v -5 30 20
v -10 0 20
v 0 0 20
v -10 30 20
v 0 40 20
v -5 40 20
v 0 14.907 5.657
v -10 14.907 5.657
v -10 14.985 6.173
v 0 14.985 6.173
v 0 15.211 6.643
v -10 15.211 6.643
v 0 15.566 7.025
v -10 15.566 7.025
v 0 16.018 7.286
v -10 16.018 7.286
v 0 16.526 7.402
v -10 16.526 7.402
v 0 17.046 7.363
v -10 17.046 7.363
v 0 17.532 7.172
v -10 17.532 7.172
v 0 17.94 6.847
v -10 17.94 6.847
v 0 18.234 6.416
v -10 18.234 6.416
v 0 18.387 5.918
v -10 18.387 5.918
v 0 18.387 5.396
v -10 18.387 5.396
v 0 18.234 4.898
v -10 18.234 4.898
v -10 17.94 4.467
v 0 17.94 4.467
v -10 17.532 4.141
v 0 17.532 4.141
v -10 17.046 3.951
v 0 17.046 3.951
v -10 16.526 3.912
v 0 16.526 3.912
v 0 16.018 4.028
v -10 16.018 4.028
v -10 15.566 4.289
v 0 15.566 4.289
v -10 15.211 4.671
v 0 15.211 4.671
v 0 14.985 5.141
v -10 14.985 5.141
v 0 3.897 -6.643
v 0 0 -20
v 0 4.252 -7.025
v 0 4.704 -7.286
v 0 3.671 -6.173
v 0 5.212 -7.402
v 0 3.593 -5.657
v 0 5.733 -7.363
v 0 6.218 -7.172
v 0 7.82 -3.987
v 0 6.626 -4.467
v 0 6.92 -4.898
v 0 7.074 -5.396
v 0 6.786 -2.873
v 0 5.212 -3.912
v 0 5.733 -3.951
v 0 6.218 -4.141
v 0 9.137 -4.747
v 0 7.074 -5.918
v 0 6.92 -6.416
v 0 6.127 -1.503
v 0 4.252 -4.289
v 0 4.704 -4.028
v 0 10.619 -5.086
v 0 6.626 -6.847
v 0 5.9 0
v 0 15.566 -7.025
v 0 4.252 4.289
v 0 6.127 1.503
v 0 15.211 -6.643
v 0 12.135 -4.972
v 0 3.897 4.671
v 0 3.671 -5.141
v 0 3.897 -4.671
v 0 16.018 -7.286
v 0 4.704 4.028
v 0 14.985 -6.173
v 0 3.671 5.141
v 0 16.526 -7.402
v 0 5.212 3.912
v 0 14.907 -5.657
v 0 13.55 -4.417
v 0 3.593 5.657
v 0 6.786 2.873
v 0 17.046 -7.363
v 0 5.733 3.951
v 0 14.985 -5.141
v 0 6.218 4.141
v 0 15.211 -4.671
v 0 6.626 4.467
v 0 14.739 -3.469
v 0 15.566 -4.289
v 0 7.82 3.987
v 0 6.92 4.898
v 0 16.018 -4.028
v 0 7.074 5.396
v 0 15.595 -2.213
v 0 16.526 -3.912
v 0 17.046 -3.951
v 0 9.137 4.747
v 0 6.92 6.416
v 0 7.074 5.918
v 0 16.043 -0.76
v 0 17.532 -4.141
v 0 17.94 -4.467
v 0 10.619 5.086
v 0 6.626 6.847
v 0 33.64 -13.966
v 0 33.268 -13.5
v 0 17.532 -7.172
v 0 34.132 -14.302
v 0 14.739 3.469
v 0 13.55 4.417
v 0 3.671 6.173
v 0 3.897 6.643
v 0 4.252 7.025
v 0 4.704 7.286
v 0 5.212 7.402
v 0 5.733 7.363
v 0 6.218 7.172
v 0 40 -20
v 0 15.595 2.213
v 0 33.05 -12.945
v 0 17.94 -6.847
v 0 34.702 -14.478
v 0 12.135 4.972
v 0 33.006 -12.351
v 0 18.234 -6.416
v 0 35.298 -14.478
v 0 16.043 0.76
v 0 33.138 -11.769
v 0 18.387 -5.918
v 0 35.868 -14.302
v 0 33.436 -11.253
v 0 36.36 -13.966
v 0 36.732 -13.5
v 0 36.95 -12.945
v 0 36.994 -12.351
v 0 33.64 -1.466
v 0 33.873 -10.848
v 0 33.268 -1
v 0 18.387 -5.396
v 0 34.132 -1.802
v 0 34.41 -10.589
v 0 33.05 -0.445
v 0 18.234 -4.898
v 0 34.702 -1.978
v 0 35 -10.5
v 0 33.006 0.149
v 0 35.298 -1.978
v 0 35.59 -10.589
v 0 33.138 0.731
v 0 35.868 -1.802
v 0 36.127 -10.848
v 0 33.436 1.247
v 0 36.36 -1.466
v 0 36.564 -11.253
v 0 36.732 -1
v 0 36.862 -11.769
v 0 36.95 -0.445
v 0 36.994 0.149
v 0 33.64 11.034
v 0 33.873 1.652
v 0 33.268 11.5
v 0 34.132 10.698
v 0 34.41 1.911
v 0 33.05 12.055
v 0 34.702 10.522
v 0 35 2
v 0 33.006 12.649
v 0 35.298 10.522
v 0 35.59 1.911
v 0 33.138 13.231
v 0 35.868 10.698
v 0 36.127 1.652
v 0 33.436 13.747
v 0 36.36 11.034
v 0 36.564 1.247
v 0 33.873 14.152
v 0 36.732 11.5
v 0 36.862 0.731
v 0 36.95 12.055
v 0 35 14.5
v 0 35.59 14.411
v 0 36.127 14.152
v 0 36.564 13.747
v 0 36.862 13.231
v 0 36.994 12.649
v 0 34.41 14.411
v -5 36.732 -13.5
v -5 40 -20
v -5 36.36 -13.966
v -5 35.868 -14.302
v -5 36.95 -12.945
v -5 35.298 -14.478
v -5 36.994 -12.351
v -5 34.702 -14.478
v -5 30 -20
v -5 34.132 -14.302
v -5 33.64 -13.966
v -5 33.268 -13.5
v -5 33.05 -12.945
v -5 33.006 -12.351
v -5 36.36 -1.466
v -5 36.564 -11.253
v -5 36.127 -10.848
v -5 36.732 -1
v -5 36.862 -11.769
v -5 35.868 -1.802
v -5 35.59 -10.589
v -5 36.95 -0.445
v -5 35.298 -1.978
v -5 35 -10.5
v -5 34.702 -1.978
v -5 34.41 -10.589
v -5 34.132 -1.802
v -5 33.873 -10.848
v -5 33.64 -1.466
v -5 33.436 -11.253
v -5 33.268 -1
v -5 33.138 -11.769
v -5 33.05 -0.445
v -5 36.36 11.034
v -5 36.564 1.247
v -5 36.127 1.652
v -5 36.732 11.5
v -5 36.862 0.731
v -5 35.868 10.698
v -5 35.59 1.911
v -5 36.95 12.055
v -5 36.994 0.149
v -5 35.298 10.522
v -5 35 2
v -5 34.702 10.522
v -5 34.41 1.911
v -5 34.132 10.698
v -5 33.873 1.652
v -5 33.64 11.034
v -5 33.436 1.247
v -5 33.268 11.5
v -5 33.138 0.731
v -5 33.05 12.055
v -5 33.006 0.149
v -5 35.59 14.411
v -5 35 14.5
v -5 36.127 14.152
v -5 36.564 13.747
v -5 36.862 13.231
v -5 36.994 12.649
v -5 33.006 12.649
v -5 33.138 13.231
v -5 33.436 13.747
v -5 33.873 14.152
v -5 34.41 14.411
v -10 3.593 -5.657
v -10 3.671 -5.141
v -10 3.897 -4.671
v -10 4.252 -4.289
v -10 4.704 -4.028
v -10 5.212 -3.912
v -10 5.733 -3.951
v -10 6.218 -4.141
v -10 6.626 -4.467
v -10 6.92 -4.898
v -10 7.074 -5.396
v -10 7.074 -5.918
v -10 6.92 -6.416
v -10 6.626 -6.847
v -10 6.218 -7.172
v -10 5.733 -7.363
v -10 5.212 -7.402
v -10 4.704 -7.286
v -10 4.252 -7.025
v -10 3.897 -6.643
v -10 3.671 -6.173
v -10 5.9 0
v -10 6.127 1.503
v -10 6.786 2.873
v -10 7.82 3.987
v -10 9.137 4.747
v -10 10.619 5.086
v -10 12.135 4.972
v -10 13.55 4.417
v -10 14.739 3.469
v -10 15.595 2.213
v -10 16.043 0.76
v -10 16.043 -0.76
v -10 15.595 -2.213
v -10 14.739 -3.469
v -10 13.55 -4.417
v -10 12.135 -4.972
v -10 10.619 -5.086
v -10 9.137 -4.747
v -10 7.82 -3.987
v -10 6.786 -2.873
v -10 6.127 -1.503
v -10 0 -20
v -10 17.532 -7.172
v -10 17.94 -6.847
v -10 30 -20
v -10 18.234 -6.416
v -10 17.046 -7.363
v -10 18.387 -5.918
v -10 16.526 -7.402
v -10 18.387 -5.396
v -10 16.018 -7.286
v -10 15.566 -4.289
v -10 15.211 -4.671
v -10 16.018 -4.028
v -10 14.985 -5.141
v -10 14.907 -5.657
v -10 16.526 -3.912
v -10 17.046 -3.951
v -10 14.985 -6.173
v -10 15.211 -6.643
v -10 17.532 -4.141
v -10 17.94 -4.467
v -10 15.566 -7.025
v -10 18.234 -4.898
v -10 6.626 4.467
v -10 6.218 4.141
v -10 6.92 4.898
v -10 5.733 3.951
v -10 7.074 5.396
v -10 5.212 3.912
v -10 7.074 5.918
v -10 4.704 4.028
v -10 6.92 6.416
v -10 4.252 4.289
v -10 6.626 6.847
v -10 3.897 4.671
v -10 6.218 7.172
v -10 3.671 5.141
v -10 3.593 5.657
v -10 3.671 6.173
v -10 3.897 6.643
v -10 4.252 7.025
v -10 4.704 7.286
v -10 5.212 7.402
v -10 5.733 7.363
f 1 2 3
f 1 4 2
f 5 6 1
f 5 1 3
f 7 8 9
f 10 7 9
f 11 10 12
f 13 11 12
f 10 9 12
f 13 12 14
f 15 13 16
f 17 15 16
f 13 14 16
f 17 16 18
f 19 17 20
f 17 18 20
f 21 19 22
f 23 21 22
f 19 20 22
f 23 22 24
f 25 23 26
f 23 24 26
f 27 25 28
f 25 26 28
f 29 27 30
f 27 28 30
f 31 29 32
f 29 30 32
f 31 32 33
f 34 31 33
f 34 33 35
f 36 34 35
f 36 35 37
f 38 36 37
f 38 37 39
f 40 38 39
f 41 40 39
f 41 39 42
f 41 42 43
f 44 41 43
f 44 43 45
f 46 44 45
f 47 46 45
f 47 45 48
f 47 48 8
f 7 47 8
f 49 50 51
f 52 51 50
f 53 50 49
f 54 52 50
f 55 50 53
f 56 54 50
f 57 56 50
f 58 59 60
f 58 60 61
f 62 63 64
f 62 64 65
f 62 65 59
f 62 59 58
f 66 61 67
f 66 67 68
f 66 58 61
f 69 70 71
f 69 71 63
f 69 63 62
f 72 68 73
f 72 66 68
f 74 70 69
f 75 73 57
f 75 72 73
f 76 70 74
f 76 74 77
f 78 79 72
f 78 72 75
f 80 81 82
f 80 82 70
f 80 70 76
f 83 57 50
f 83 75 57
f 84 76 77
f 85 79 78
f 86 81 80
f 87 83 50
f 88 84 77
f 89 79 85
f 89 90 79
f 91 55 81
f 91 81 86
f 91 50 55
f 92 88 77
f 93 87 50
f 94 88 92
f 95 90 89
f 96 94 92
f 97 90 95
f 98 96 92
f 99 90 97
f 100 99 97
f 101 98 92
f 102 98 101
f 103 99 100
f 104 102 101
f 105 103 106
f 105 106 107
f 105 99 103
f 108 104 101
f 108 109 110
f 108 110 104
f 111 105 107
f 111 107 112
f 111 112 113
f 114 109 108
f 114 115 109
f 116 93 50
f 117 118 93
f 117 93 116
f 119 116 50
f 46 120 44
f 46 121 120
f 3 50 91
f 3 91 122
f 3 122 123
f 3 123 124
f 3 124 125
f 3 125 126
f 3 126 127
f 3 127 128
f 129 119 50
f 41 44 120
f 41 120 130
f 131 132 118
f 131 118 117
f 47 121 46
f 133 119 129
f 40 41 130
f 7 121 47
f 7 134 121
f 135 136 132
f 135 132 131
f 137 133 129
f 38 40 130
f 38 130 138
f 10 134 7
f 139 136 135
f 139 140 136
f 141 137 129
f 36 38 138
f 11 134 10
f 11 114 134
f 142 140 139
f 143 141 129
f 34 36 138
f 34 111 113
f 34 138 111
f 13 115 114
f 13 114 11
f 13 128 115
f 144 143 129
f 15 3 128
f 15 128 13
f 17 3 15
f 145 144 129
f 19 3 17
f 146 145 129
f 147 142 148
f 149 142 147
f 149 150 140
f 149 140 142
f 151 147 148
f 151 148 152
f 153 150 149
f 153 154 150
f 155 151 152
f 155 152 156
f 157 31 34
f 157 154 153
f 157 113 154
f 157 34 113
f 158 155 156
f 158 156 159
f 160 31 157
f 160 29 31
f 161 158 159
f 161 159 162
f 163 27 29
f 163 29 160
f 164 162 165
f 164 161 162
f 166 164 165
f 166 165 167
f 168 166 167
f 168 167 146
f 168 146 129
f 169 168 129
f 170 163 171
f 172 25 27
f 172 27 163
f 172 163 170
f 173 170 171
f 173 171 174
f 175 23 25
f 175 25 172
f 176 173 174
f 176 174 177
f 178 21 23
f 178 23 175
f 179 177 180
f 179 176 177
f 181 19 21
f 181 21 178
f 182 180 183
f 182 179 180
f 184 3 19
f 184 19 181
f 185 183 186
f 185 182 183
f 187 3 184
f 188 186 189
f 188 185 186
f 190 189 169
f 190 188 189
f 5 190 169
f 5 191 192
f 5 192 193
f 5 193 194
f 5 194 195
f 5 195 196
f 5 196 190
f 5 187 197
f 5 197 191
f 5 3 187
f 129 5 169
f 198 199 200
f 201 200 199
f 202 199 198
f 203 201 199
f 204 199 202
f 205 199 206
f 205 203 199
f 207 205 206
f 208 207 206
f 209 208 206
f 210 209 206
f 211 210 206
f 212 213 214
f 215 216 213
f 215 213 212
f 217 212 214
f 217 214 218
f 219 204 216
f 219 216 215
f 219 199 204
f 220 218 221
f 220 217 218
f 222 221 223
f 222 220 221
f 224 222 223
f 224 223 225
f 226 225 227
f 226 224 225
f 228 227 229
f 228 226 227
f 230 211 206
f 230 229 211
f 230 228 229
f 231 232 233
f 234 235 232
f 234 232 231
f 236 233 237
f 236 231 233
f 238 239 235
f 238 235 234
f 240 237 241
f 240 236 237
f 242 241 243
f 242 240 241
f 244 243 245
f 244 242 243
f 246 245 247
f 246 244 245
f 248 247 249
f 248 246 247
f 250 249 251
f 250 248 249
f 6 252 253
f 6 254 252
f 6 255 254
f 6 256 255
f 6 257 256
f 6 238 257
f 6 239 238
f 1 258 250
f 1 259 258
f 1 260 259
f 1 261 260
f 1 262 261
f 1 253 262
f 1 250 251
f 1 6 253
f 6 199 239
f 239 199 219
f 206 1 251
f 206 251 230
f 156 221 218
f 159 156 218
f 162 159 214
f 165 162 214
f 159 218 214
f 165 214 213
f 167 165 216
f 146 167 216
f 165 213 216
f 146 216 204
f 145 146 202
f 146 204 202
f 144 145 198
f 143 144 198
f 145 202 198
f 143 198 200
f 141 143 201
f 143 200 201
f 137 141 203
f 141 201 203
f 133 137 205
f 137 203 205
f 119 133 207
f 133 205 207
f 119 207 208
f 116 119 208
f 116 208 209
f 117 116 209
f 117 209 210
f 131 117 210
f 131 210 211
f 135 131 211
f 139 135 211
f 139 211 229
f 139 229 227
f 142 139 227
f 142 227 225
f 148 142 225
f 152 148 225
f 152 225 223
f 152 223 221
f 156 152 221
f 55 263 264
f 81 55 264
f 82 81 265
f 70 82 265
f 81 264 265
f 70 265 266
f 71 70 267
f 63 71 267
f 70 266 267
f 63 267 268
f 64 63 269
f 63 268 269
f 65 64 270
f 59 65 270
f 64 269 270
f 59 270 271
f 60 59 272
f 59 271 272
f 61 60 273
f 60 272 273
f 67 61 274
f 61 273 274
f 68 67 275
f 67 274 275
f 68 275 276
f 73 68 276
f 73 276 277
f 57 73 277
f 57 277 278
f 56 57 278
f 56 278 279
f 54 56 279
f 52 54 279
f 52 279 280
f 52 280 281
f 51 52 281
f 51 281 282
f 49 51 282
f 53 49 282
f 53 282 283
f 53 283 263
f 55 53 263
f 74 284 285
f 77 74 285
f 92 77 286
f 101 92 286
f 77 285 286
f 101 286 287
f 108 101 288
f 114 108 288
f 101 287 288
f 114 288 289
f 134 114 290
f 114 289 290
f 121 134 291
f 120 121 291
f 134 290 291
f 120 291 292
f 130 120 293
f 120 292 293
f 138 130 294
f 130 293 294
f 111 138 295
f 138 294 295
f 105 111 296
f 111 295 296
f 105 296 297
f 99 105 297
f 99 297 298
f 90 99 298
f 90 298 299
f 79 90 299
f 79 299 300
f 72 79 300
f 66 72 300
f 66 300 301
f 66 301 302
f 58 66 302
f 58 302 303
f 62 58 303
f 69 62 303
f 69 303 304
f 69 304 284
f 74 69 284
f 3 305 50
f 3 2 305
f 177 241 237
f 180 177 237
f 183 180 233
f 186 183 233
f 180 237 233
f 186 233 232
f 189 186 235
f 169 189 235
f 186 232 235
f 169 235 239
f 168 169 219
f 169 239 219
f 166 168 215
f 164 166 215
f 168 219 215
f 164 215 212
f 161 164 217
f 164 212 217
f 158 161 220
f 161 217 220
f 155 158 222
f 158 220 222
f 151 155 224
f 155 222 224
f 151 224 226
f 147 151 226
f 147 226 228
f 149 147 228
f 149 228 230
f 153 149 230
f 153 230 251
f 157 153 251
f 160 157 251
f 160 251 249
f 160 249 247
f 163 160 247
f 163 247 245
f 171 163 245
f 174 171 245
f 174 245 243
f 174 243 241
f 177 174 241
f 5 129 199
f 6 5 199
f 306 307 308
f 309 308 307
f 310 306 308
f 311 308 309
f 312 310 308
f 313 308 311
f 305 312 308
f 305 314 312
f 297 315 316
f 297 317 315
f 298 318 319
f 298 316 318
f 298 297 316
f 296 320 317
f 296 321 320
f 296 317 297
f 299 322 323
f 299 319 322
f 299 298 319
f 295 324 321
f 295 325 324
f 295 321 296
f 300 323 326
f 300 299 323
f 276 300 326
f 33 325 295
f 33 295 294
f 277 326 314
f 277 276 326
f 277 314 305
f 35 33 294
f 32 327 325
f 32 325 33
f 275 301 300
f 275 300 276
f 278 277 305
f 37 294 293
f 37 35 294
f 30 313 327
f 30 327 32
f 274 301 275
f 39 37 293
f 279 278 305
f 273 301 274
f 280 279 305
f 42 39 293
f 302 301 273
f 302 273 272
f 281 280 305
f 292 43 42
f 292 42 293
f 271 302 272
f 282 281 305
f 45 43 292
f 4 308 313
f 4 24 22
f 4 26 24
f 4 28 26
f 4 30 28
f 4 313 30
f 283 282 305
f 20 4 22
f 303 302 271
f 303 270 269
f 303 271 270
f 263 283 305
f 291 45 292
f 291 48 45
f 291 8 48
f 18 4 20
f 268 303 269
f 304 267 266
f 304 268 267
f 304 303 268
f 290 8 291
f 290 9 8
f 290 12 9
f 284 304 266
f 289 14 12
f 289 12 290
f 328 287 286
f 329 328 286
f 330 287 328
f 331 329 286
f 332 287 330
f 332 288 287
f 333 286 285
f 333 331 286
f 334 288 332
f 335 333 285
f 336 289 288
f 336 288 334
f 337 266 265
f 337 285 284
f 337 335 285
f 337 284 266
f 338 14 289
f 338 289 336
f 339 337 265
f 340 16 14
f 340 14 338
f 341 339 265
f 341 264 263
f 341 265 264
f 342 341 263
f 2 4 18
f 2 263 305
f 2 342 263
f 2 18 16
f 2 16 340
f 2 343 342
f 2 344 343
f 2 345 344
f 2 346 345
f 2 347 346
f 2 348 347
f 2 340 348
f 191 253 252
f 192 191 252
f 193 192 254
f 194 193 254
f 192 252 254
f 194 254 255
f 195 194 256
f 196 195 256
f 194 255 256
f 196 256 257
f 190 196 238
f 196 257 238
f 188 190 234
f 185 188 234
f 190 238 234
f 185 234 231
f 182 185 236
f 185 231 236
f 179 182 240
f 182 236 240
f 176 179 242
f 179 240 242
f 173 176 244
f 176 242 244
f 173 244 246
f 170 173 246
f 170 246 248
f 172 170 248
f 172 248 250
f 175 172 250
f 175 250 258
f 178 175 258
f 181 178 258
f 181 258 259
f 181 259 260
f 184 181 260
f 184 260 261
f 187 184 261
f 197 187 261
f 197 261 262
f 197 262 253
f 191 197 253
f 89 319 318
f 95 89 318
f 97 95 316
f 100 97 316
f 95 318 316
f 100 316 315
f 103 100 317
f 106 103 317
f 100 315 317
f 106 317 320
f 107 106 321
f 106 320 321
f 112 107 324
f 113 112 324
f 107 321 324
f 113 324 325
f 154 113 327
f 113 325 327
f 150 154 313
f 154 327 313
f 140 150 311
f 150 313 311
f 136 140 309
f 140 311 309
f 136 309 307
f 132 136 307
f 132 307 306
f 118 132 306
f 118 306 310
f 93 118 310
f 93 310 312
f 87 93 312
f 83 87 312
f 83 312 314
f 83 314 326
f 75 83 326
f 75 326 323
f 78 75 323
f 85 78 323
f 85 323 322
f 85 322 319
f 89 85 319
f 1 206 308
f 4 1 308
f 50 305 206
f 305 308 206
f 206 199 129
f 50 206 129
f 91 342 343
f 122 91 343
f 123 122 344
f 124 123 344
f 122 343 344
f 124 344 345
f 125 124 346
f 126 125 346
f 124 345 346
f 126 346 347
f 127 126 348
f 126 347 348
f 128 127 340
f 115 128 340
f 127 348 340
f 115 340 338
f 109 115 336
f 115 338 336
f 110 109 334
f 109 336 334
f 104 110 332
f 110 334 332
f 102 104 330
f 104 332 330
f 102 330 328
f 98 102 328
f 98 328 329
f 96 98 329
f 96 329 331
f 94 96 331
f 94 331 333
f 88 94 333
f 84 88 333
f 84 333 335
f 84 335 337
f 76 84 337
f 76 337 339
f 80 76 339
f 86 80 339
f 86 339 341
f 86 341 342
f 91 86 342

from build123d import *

# Parameters (mm, degrees)
BOSS_EXTRUDE1_DEPTH      = 20
SKETCH2_R                = 5.1
SKETCH2_R_2              = 1.75
CUT_EXTRUDE1_DEPTH       = 79.89866919
CUT_EXTRUDE2_DEPTH       = 92.241437954
F_4_0_4_DIAMETER_HOLE1_D = 4


with BuildPart() as part:
    # Sketch1 → Boss-Extrude1 (new, symmetric)
    with BuildSketch(Plane.XY):
        Polygon((0, 0), (0, 65), (-50, 65), (-50, 55), (-10, 55), (-10, 0), align=None)
    extrude(amount=BOSS_EXTRUDE1_DEPTH, both=True)

    # Sketch2 → Cut-Extrude1 (cut, through all)
    with BuildSketch(Plane.ZY.offset(10)):
        with Locations(Location((0, 11, 0), (0, 0, 270))):
            Circle(SKETCH2_R)
        with Locations(Location((5.656854249, 16.656854249, 0), (0, 0, 270))):
            Circle(SKETCH2_R_2)
        with Locations(Location((5.656854249, 5.343145751, 0), (0, 0, 270))):
            Circle(SKETCH2_R_2)
        with Locations(Location((-5.656854249, 16.656854249, 0), (0, 0, 270))):
            Circle(SKETCH2_R_2)
        with Locations(Location((-5.656854249, 5.343145751, 0), (0, 0, 270))):
            Circle(SKETCH2_R_2)
    extrude(amount=-CUT_EXTRUDE1_DEPTH, mode=Mode.SUBTRACT)

    # Sketch3 → Cut-Extrude2 (cut, through all)
    with BuildSketch(Plane.XY.offset(20)):
        Polygon((-50, 65), (0, 65), (0, 40), (-5, 40), (-5, 30), (-10, 30), (-10, 55), (-50, 55), align=None)
    extrude(amount=-CUT_EXTRUDE2_DEPTH, mode=Mode.SUBTRACT)

    # Ø4.0 (4) Diameter Hole1 (through all)
    with Locations(Plane(origin=(0, 0, 0), x_dir=(0, 0, -1), z_dir=(1, 0, 0))):
        with Locations((-12.5, 35), (0, 35), (12.5, 35)):
            Hole(F_4_0_4_DIAMETER_HOLE1_D / 2)


solid = part.part
